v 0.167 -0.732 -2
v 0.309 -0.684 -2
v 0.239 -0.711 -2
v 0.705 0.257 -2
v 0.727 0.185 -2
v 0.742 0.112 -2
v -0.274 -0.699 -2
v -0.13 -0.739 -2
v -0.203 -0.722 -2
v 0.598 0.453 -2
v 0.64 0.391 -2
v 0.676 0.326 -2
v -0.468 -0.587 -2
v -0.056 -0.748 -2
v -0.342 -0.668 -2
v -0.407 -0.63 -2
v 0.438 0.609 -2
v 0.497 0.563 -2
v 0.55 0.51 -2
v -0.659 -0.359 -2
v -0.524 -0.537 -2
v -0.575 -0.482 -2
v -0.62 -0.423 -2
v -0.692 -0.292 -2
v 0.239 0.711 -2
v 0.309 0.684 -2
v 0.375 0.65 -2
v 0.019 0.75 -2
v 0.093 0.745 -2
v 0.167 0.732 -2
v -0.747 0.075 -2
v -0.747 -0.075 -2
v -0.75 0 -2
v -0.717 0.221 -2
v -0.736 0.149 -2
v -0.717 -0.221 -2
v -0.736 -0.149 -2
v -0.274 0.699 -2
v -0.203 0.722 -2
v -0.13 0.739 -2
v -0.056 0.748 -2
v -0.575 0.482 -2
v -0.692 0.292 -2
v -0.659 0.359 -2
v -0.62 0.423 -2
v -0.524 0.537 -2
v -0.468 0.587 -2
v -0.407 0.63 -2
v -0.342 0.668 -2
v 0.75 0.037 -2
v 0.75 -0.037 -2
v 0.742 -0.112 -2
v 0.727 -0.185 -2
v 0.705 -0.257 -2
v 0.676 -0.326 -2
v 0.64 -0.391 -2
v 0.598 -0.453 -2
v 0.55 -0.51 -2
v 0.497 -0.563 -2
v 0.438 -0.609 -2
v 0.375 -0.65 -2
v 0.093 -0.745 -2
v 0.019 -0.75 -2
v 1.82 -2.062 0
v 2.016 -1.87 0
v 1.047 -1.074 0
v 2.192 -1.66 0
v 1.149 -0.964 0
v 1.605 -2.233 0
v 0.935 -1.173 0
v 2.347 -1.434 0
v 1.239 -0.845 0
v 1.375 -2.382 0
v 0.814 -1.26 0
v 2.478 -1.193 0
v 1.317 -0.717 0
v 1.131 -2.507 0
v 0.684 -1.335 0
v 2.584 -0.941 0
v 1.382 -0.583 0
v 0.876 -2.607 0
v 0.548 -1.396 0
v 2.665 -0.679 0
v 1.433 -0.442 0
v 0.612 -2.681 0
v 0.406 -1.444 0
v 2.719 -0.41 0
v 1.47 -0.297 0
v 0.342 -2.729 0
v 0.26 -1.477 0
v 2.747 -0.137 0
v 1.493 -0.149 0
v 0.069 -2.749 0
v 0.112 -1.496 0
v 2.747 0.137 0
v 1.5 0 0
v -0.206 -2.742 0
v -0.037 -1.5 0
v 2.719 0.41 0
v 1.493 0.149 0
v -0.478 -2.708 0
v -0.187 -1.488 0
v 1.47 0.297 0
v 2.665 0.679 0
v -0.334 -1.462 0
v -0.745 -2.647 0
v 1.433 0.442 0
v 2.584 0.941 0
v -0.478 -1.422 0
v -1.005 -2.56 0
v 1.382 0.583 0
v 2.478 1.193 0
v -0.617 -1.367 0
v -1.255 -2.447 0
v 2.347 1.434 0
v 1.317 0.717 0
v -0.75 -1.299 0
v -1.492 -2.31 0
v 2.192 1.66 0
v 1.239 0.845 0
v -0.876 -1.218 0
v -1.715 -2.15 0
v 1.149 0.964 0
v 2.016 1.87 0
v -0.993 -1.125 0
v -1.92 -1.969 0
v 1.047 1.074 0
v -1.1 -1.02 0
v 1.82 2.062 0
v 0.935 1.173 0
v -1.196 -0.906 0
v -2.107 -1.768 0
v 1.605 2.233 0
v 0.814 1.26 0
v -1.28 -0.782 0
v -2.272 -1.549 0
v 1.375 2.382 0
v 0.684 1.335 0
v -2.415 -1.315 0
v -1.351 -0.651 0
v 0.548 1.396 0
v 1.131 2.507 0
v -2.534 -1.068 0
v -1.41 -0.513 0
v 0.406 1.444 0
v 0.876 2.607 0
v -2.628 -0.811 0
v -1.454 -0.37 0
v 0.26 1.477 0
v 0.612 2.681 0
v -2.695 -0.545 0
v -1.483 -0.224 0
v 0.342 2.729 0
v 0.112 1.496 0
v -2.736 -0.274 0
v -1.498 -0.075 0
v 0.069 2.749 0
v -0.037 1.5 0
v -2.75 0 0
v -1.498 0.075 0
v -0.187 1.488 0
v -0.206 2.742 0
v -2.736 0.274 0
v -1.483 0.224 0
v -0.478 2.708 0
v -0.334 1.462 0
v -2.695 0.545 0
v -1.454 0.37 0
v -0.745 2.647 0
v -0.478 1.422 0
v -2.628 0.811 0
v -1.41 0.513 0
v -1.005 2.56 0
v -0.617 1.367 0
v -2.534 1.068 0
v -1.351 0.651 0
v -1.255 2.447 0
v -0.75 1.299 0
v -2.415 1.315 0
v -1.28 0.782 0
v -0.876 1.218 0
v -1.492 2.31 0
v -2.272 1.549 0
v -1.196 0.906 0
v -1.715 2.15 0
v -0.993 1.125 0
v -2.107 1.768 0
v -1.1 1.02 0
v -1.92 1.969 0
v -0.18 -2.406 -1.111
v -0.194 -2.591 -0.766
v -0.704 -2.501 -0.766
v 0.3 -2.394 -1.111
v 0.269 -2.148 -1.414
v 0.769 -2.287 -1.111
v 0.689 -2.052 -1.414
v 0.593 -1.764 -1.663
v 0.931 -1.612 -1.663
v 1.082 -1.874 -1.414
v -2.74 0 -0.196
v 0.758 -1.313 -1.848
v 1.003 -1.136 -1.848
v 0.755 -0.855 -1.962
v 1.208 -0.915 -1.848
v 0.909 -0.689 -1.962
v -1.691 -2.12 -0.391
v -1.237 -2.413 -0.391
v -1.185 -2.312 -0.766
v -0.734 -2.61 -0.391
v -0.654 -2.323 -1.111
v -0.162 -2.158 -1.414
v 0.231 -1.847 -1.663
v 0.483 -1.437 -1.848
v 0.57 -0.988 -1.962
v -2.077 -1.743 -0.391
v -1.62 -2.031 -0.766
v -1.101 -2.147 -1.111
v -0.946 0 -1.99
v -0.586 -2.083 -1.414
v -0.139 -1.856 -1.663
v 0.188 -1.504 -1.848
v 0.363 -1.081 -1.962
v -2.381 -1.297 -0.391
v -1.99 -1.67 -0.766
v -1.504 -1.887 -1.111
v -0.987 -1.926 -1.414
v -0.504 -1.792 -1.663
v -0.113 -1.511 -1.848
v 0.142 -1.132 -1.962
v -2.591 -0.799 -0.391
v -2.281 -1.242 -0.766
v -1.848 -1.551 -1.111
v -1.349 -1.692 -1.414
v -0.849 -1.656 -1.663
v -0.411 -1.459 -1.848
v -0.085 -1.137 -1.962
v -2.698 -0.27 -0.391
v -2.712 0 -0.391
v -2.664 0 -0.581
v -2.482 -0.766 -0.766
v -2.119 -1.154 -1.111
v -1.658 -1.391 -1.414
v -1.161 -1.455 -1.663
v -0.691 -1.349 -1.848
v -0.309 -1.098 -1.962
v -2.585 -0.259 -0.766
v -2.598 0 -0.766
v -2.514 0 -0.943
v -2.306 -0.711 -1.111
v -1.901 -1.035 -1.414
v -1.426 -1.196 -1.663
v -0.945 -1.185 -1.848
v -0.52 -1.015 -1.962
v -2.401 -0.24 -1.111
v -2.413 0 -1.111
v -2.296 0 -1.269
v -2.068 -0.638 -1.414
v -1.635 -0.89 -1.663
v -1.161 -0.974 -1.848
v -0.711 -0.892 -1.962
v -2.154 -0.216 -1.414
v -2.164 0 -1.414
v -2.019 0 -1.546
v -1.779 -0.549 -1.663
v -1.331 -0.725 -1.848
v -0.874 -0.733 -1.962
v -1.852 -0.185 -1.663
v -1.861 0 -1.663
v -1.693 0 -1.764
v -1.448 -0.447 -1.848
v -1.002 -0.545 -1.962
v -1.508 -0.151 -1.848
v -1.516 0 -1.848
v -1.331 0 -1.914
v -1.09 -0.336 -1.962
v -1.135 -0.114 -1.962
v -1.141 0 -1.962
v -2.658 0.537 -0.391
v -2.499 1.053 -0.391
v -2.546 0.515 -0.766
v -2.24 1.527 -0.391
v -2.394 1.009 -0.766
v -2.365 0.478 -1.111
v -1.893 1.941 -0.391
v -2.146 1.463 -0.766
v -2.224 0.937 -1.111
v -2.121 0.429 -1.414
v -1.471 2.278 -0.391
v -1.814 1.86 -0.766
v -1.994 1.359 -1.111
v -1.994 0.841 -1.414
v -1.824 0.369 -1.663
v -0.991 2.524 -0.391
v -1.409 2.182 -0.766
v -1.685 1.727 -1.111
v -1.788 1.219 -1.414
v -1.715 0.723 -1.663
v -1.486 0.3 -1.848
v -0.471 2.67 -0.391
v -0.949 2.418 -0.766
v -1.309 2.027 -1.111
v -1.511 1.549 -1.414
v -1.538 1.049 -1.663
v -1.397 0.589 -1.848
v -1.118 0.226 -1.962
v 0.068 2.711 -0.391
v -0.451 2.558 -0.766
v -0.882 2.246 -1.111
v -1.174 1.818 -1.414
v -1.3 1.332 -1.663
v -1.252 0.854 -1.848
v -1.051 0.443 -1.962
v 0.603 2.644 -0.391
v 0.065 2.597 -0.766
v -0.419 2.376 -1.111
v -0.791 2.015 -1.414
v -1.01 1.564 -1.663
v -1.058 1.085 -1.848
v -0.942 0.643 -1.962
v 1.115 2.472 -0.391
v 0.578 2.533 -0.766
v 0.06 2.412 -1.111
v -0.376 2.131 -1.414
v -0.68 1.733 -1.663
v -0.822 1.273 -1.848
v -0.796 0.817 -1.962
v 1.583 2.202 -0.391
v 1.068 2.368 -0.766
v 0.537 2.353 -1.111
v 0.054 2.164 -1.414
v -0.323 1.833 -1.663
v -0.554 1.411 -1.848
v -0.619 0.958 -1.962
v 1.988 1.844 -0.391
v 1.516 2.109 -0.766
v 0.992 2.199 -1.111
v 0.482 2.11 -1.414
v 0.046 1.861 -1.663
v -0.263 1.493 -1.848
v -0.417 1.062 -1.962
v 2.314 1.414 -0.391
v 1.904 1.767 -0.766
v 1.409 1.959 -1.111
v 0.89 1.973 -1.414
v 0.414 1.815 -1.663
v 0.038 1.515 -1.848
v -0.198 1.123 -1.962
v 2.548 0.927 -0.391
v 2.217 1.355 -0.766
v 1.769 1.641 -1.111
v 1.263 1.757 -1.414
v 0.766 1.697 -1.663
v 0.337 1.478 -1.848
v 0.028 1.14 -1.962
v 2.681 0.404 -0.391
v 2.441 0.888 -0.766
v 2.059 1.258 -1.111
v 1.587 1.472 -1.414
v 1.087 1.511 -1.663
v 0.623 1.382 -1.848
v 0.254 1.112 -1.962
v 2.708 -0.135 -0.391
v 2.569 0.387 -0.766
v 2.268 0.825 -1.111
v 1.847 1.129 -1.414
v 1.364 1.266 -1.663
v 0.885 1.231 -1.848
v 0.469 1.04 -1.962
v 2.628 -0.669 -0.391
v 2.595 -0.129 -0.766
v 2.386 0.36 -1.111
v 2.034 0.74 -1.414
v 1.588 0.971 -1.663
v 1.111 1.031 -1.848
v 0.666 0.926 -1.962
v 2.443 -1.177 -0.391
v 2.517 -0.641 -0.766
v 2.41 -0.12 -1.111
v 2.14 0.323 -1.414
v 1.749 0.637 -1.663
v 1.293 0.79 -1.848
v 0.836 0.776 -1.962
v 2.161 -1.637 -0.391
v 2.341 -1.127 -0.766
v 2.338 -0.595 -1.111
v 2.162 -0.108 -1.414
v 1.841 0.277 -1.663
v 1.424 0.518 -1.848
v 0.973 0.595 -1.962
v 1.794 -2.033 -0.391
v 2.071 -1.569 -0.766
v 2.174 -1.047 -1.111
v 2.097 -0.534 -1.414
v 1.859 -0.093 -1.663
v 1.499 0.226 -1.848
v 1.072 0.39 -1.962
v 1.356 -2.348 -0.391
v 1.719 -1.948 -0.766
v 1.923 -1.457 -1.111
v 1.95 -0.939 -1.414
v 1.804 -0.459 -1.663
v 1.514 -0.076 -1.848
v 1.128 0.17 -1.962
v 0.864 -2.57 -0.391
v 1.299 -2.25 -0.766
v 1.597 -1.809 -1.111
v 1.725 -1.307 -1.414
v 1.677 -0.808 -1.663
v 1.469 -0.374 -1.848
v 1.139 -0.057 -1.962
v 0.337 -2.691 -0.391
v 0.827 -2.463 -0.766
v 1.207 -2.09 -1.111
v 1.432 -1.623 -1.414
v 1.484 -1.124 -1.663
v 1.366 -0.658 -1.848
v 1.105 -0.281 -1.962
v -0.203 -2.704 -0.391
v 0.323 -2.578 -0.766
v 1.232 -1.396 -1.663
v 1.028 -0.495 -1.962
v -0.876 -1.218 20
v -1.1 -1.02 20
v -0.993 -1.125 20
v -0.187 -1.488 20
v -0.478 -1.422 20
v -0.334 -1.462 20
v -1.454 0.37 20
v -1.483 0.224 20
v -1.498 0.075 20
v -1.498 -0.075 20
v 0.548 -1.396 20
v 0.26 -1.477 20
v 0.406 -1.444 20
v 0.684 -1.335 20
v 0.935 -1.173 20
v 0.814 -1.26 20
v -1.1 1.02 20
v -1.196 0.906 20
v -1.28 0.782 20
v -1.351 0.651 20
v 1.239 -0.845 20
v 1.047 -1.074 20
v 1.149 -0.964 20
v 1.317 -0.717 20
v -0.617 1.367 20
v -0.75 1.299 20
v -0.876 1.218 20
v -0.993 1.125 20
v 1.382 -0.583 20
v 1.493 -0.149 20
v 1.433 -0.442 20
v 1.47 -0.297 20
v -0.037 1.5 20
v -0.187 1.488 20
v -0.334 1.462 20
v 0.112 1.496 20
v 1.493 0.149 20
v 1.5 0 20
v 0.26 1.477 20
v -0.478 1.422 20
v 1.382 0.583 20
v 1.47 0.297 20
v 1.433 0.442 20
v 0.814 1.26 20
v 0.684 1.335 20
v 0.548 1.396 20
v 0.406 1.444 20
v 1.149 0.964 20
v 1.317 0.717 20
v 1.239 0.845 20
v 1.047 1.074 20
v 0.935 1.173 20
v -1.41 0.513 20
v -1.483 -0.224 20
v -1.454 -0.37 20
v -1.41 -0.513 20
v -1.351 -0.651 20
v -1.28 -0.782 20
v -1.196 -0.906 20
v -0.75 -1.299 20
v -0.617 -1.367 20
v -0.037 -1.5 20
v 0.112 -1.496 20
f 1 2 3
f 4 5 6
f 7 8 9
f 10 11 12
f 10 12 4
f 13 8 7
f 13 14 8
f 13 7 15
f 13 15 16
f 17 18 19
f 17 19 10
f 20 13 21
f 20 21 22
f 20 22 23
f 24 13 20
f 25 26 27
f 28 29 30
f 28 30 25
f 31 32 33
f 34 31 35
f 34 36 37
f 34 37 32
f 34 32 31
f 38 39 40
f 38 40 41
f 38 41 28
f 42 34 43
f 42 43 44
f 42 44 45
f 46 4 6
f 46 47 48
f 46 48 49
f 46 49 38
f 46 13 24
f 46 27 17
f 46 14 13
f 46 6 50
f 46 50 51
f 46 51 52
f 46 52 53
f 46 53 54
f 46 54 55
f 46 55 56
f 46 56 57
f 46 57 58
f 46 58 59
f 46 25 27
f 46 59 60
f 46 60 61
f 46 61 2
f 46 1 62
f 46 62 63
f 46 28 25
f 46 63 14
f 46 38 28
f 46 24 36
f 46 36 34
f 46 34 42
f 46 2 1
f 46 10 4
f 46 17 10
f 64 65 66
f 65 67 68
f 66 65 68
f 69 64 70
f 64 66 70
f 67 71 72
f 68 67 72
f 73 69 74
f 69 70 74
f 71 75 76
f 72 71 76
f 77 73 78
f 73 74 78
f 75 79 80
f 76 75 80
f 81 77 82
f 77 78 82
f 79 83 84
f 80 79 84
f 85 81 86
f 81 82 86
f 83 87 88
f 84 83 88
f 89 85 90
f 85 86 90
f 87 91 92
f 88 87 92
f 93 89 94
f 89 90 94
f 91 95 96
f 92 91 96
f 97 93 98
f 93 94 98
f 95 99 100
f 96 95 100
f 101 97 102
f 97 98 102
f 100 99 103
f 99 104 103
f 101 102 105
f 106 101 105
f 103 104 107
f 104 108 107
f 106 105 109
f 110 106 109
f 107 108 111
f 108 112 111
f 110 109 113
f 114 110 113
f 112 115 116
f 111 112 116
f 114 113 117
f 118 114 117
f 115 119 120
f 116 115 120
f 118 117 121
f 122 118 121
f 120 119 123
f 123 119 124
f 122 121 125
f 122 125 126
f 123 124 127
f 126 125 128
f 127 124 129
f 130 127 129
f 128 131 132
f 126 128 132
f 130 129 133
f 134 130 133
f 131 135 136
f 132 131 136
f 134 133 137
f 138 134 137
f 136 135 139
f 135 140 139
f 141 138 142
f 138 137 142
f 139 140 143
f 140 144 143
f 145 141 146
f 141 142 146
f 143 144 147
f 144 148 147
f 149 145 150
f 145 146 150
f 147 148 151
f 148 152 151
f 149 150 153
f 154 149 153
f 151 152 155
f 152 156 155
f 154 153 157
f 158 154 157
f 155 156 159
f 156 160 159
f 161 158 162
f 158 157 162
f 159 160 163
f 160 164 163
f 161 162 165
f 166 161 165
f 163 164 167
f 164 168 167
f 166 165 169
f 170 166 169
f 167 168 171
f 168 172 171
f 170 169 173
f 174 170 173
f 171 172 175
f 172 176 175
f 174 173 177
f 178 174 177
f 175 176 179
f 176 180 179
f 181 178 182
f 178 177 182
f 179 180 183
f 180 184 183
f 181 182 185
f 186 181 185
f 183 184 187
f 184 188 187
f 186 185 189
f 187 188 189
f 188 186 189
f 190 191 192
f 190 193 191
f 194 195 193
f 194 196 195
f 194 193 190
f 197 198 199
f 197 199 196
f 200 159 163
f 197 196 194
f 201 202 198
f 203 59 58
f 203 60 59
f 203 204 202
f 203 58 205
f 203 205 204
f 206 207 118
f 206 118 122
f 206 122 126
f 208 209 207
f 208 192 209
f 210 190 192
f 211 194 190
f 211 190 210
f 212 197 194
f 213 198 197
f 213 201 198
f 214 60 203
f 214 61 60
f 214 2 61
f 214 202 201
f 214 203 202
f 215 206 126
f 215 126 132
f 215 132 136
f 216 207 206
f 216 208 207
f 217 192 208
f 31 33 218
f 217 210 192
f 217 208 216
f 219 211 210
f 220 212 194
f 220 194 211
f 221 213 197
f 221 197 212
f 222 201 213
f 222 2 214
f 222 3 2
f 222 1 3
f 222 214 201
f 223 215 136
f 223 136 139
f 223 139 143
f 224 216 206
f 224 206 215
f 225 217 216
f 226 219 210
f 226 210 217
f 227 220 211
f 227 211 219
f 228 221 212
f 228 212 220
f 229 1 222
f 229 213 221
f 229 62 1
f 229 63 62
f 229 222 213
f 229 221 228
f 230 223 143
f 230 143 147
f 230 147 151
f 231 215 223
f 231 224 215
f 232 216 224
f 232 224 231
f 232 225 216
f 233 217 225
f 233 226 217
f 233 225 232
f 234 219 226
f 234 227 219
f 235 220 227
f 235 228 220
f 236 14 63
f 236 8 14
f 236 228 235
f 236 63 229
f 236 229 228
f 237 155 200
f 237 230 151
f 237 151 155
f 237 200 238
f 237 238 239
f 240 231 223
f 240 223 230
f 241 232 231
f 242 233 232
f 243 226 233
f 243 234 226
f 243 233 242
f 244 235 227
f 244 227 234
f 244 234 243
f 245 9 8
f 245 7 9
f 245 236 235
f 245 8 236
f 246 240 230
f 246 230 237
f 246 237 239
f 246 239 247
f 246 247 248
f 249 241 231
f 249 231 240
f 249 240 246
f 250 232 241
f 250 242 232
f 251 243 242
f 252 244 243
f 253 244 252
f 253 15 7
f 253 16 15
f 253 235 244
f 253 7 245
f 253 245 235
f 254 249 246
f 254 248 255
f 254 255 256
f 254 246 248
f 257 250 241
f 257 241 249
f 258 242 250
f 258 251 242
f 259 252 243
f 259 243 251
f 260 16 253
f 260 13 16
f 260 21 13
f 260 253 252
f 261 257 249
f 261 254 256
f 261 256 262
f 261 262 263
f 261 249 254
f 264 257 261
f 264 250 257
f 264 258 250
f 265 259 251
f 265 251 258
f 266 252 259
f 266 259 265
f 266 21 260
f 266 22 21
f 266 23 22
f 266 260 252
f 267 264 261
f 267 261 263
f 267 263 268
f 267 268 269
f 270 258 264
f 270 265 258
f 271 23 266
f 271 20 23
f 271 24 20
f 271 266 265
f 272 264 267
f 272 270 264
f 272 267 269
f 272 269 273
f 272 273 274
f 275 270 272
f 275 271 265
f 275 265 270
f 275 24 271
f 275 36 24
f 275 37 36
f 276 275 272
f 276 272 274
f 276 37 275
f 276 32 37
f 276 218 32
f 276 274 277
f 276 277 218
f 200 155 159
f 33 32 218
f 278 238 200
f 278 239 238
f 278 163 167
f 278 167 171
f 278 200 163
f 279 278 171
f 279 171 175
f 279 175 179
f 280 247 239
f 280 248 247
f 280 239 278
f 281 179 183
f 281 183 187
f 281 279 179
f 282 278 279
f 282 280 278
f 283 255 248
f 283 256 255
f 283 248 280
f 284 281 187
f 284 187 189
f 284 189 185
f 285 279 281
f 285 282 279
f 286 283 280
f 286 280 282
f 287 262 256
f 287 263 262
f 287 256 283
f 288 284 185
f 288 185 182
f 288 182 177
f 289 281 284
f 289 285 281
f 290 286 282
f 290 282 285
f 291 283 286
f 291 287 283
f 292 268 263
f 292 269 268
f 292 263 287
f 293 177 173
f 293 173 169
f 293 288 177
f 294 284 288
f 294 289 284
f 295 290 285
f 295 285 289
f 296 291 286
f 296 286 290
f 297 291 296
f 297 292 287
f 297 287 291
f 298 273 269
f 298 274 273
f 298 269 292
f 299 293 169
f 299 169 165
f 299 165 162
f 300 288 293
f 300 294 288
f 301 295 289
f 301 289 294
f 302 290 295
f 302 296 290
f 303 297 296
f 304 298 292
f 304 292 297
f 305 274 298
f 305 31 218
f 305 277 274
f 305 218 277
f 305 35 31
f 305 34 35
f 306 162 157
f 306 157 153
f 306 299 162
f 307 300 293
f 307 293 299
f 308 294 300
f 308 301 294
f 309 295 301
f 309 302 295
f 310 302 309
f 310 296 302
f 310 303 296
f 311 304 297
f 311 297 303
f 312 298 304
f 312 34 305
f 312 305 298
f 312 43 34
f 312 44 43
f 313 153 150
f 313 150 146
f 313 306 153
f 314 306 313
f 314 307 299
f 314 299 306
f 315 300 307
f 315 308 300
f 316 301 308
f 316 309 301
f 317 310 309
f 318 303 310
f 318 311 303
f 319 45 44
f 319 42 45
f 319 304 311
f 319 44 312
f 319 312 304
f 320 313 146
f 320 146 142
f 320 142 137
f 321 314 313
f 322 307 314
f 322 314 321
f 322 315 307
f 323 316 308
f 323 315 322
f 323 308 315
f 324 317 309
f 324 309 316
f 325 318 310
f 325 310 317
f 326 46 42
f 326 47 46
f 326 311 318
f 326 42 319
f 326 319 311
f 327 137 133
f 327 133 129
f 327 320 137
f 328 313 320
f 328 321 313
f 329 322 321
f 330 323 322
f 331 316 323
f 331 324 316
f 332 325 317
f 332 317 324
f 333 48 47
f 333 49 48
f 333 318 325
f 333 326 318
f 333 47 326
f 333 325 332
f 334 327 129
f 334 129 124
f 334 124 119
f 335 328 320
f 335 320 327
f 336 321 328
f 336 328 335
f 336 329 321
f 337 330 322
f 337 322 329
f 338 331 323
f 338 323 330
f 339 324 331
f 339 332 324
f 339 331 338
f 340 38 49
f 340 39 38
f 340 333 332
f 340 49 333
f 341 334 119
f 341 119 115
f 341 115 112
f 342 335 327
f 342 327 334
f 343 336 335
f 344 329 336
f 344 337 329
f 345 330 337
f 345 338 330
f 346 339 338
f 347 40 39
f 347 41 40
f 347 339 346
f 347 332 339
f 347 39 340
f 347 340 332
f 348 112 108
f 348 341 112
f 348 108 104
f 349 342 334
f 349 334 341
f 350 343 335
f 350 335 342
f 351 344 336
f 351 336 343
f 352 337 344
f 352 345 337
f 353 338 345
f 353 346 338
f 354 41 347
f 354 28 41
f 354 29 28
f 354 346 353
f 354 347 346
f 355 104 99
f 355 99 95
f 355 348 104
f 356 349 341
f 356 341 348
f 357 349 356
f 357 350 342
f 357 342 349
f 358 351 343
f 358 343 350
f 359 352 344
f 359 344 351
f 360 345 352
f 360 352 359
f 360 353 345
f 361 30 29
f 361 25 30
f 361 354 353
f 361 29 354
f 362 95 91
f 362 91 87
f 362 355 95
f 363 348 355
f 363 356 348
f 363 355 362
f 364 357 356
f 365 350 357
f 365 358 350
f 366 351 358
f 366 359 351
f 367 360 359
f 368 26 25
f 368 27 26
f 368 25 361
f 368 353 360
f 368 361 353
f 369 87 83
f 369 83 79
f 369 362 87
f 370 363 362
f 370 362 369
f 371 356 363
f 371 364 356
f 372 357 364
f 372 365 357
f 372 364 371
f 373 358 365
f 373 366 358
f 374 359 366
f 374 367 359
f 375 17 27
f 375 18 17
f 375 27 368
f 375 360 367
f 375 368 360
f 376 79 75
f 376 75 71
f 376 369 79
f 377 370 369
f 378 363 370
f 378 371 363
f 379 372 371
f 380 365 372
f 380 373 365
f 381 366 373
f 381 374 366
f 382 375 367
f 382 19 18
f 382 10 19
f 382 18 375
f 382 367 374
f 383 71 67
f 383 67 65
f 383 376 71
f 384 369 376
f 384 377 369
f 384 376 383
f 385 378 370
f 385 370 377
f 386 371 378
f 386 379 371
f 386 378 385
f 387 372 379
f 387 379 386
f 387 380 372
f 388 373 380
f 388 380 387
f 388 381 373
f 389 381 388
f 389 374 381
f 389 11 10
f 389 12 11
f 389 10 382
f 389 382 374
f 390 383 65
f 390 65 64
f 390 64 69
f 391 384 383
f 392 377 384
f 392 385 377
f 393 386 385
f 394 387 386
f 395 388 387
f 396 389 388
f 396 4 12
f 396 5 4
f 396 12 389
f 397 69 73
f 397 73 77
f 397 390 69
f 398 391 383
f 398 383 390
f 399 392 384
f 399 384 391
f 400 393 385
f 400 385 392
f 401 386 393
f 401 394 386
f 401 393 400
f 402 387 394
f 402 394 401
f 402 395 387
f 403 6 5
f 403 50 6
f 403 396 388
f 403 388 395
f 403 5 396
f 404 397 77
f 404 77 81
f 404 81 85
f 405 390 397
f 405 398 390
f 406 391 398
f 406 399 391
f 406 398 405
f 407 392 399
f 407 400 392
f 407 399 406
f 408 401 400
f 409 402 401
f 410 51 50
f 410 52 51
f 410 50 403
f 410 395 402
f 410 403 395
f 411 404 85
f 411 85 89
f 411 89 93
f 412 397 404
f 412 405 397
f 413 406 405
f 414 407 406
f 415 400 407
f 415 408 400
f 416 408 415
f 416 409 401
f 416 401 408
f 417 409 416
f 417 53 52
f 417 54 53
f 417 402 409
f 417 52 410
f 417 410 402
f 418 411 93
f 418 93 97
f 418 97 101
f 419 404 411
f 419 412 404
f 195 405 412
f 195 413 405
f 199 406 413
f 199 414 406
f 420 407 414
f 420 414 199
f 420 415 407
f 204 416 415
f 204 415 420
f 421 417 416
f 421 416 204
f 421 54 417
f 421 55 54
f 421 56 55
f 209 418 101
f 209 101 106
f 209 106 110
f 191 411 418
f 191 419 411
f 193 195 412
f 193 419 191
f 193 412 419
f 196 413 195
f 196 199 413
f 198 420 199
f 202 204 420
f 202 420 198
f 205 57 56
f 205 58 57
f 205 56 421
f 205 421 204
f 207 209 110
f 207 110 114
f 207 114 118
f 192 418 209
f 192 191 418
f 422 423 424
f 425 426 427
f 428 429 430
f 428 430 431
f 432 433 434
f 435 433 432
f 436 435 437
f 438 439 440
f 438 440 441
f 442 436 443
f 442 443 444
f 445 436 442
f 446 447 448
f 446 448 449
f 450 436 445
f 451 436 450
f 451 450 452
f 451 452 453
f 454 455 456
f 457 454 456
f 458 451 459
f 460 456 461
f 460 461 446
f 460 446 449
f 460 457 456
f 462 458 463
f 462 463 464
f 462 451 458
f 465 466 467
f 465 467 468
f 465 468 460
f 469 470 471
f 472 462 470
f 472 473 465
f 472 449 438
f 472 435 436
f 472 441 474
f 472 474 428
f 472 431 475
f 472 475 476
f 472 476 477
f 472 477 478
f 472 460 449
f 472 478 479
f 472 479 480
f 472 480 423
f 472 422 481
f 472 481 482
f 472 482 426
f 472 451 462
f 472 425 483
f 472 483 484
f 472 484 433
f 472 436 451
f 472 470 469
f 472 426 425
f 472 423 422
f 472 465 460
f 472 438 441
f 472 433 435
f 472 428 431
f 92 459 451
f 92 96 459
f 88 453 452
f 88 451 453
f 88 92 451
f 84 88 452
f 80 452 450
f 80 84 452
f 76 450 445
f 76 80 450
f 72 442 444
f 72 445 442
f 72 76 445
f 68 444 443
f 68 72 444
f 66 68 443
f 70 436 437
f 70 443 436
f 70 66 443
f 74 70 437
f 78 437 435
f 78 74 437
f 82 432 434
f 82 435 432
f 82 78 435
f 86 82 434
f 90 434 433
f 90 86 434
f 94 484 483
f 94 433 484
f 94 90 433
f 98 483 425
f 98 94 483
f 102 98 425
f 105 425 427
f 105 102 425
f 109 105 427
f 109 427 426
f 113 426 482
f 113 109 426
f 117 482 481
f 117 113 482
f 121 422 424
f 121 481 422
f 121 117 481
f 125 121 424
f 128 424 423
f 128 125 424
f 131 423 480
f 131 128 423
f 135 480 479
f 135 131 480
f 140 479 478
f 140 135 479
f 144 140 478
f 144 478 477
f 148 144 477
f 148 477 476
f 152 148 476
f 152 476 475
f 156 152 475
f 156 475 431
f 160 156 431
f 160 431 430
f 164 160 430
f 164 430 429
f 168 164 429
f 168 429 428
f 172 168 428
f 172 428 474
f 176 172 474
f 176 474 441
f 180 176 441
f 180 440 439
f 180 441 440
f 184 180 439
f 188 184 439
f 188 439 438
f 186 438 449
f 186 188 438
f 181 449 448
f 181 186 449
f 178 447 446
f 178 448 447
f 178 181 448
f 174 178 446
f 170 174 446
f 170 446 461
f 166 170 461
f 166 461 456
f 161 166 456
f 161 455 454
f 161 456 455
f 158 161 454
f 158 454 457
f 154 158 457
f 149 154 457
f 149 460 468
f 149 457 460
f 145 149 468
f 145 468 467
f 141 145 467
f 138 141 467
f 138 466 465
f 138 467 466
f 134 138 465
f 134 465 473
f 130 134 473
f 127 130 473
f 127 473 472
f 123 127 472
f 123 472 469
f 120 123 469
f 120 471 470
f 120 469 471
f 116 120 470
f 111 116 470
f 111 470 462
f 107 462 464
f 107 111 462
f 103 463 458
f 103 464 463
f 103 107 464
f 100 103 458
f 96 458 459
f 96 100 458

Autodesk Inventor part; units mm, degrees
ref_plane "YZ Plane" through (0, 0, 0) normal (1, 0, 0) x (0, 1, 0)
ref_plane "XZ Plane" through (0, 0, 0) normal (0, 1, 0) x (-1, 0, 0)
ref_plane "XY Plane" through (0, 0, 0) normal (0, 0, 1) x (1, 0, 0)
sketch "スケッチ1" plane through (0, 0, 0) normal (0, 0, 1) x (1, 0, 0)
  circle A0 centre (0, 0) radius 1.5
  dimension "d0" = 3
extrude "押し出し1" add sketch "スケッチ1" along normal blind 20
sketch "スケッチ2" plane through (0, 0, 0) normal (0, 0, -1) x (-1, 0, 0)
  circle A0 centre (0, 0) radius 2.75
  dimension "d3" = 5.5
extrude "押し出し2" add sketch "スケッチ2" along normal blind 2
fillet "フィレット1" radius 2 1 edges at (2.75, 0, -2)
thread "ねじ1" size "M3x0.5" class "6g" standard "ANSI Metric M Profile" full length
properties part number "ネジ鍋m3,20" material "鋼、高強度、低合金"
